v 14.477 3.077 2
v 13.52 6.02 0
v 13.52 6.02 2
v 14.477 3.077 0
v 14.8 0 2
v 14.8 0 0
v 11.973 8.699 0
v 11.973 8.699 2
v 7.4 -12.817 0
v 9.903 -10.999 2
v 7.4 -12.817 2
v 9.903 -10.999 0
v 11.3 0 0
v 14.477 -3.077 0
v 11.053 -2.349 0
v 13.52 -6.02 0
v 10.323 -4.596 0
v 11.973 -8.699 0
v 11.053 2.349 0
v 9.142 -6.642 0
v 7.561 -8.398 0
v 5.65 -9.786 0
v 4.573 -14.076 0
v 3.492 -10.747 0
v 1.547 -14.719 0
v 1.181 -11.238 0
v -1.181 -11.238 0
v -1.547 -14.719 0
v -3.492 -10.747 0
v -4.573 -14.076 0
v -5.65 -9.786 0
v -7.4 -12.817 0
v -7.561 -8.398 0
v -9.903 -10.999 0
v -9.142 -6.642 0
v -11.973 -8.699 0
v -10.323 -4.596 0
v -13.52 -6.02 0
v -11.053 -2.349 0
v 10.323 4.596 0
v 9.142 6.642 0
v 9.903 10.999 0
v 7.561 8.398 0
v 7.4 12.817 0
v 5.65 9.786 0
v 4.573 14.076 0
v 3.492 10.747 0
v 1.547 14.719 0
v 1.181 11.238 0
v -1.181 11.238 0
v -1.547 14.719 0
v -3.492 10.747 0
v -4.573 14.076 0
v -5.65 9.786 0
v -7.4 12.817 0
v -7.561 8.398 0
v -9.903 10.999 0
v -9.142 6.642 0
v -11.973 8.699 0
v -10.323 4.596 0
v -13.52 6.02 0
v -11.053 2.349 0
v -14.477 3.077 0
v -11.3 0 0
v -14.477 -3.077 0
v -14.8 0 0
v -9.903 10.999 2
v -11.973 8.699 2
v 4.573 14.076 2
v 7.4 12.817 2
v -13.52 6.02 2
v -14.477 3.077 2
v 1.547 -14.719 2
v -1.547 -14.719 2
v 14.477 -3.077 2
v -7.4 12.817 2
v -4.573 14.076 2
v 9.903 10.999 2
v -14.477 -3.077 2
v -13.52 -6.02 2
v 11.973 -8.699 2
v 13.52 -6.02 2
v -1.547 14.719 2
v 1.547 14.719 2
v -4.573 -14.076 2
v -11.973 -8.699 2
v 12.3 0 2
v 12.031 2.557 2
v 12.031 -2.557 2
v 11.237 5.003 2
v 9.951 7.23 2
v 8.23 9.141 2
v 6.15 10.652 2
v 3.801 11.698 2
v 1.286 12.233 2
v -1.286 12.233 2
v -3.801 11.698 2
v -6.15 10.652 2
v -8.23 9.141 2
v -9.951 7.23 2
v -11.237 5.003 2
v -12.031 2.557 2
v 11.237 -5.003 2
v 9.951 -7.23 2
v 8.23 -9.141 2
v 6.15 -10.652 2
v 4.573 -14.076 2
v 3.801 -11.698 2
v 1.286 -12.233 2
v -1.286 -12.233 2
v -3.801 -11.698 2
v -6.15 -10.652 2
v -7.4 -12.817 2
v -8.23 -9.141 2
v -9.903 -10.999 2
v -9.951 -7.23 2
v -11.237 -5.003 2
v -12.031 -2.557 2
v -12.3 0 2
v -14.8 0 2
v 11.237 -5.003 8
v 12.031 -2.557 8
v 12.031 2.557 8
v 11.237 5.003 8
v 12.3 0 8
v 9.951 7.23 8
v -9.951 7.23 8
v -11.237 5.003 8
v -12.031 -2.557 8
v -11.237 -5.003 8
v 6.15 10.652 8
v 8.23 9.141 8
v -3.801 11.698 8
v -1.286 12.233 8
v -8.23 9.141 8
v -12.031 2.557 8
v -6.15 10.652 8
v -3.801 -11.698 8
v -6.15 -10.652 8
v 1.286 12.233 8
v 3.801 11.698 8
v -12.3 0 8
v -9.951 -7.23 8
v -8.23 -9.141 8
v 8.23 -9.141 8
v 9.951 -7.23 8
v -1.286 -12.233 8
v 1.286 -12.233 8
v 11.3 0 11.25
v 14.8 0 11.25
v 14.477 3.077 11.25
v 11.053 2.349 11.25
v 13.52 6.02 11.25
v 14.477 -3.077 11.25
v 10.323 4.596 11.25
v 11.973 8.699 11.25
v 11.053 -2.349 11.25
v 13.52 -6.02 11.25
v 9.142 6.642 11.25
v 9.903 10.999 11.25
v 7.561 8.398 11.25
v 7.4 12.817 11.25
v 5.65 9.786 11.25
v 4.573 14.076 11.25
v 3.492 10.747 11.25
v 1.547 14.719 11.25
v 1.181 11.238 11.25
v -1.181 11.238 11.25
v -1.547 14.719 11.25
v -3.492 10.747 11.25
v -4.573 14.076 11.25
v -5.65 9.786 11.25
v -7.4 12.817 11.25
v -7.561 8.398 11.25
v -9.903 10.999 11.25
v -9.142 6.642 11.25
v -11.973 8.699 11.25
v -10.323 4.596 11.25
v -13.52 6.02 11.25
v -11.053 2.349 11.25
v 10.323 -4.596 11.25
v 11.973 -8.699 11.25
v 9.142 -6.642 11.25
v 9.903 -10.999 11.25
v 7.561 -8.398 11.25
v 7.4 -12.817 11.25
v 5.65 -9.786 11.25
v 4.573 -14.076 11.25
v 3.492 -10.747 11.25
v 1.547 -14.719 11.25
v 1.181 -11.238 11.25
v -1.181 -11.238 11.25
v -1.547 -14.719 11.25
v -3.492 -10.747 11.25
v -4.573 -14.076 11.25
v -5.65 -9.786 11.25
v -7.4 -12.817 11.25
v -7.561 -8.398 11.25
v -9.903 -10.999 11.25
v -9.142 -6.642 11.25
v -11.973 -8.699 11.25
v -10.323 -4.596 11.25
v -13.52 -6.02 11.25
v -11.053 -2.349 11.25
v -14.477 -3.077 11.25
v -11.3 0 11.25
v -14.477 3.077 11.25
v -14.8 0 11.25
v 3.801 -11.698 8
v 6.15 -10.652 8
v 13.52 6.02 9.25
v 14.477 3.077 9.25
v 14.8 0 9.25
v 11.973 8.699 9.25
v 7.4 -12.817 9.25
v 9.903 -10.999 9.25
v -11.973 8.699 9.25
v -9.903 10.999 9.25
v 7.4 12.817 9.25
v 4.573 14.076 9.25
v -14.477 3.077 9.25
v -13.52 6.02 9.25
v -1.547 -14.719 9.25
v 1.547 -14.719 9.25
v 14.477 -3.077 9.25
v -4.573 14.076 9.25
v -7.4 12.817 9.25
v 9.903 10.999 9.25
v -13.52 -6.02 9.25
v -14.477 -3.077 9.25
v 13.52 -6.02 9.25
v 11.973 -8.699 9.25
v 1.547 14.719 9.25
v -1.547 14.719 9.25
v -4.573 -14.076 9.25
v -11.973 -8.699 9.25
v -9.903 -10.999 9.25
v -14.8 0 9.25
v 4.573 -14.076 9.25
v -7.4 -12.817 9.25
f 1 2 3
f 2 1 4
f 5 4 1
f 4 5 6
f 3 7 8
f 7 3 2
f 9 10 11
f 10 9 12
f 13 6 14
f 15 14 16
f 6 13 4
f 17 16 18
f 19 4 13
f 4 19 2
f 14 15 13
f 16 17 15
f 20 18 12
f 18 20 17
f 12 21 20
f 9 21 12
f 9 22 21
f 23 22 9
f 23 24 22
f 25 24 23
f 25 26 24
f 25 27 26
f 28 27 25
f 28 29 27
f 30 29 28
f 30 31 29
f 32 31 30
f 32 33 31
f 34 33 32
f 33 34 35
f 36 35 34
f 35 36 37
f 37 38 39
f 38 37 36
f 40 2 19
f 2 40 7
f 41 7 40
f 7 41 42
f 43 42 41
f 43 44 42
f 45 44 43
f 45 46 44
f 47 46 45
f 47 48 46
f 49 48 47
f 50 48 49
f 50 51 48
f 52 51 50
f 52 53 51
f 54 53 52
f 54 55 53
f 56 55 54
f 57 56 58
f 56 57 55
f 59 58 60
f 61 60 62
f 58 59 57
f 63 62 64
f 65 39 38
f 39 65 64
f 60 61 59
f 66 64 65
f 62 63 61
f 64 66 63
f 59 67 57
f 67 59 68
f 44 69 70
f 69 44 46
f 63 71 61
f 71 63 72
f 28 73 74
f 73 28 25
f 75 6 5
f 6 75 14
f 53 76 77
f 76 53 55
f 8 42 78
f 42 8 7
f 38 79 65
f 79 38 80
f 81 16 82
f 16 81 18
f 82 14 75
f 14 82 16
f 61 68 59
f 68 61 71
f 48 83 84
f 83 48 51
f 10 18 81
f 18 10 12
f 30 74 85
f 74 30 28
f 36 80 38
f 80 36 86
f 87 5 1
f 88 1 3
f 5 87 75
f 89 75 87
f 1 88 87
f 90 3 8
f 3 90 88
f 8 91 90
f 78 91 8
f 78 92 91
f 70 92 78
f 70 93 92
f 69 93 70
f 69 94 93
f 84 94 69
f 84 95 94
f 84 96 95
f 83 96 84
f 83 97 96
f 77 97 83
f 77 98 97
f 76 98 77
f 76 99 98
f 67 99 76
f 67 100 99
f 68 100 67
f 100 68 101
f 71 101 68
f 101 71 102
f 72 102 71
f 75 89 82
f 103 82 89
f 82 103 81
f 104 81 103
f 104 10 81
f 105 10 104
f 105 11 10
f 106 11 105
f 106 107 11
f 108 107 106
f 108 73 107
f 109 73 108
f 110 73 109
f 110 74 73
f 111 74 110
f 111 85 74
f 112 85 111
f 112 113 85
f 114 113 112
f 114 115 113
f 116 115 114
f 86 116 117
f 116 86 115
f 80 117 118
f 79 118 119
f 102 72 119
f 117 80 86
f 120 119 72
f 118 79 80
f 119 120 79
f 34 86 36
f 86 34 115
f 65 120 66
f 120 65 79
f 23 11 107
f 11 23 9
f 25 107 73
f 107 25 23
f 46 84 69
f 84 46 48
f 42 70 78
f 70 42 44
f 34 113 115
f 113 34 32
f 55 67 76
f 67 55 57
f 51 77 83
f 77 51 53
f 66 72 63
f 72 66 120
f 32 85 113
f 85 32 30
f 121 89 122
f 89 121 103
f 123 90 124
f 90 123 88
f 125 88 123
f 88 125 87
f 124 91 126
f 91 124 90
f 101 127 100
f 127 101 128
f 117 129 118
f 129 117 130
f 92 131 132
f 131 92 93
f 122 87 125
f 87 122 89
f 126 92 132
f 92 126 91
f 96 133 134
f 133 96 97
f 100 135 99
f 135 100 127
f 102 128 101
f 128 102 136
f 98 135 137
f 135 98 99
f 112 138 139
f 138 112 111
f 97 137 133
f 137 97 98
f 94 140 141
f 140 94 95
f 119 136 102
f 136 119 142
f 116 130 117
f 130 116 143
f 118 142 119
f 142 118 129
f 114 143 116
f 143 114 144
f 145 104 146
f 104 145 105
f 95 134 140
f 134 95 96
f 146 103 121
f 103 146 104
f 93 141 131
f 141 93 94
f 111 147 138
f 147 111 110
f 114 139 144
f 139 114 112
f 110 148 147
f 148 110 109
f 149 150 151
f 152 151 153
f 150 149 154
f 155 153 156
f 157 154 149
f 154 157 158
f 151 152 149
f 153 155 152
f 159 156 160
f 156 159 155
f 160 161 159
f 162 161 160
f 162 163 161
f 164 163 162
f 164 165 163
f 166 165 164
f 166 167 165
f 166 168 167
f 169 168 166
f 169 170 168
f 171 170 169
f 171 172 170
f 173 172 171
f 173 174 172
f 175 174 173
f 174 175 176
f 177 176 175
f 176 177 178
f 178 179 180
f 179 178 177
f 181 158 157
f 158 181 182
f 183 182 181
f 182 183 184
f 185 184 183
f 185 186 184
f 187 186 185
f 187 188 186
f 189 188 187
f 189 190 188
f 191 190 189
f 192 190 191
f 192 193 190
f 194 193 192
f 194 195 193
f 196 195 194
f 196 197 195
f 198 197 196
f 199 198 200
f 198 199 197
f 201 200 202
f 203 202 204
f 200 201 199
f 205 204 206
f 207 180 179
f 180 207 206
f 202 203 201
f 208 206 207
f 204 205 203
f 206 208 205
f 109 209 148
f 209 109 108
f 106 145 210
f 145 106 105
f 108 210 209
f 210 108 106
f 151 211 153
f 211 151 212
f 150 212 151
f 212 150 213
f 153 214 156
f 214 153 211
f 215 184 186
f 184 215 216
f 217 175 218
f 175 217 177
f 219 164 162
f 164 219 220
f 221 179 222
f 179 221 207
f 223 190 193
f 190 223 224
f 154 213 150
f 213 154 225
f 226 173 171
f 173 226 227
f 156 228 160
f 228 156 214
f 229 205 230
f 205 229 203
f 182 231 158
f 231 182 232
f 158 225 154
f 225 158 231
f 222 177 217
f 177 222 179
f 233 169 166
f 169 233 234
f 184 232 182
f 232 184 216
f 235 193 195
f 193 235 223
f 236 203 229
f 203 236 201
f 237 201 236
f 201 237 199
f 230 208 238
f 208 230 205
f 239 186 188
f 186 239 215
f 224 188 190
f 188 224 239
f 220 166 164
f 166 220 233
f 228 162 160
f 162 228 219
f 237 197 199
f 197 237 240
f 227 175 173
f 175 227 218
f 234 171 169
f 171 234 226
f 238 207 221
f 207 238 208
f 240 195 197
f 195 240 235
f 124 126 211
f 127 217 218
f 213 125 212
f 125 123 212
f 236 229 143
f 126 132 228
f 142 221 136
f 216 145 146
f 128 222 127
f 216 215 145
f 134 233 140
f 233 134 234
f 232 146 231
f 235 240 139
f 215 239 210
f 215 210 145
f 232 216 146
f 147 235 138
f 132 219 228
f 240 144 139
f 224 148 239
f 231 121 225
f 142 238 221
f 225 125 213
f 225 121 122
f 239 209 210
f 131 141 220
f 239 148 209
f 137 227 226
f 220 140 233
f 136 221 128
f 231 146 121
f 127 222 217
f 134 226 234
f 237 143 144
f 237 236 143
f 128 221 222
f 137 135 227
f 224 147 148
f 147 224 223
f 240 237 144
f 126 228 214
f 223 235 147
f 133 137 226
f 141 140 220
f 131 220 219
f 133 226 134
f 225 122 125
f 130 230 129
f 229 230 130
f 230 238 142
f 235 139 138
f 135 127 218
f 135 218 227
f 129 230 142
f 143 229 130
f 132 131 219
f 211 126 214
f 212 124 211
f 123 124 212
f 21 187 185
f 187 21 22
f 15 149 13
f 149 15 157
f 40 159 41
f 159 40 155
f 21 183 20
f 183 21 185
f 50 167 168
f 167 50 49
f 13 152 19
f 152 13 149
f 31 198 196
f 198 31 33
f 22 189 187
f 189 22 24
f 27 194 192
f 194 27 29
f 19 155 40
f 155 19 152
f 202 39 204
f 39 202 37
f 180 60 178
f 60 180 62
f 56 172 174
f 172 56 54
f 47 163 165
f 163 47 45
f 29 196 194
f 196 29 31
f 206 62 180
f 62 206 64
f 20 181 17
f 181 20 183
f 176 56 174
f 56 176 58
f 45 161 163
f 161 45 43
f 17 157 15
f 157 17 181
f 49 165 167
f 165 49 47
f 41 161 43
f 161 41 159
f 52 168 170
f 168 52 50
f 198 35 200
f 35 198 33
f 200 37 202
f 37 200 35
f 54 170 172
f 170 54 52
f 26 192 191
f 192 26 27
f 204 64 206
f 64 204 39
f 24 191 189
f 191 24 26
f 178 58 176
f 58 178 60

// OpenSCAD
//variables (mm)
bearingOD = 22;// bearing diameter
bearingwidth = 12;
beltwidth= 6;

slopfactor = .6; // it printed a bit tight on my printer so i added this slop factor to make the hole slightly looser.. you may not need it

thickness = 2;

	idlerID = bearingOD + slopfactor; 

	idlerOD = idlerID+thickness;
	$fn=30; //faceting

//these are the lips that hold the belt on
	lipheight = 2.5;
	lipthickness = 2;
	topangle = 60; //the angle the top lip overhang makes. You can increase this to lower the idler profile.

//construction
	difference(){
	union(){
	cylinder(r=lipheight+idlerOD/2, h=lipthickness);
		cylinder(r=idlerOD/2, h = lipthickness*2+beltwidth+lipheight*cos(topangle));
		translate([0,0,lipthickness+beltwidth+lipheight*cos(topangle)])cylinder(r=lipheight+idlerOD/2, h=lipthickness);
		translate([0,0,beltwidth+lipthickness])cylinder(r1=idlerOD/2, r2=lipheight+idlerOD/2, h=lipheight*cos(topangle));
		}
		translate([0,0,-.1+lipthickness+(beltwidth-bearingwidth)/2])cylinder(r=idlerID/2, h=lipthickness+beltwidth+lipheight*2-(beltwidth-bearingwidth)/2);
            // inner lip to hold bearing
		translate([0,0,-1])cylinder(r=idlerID/2-1, h=lipthickness+1+(beltwidth-bearingwidth)/2);
}
